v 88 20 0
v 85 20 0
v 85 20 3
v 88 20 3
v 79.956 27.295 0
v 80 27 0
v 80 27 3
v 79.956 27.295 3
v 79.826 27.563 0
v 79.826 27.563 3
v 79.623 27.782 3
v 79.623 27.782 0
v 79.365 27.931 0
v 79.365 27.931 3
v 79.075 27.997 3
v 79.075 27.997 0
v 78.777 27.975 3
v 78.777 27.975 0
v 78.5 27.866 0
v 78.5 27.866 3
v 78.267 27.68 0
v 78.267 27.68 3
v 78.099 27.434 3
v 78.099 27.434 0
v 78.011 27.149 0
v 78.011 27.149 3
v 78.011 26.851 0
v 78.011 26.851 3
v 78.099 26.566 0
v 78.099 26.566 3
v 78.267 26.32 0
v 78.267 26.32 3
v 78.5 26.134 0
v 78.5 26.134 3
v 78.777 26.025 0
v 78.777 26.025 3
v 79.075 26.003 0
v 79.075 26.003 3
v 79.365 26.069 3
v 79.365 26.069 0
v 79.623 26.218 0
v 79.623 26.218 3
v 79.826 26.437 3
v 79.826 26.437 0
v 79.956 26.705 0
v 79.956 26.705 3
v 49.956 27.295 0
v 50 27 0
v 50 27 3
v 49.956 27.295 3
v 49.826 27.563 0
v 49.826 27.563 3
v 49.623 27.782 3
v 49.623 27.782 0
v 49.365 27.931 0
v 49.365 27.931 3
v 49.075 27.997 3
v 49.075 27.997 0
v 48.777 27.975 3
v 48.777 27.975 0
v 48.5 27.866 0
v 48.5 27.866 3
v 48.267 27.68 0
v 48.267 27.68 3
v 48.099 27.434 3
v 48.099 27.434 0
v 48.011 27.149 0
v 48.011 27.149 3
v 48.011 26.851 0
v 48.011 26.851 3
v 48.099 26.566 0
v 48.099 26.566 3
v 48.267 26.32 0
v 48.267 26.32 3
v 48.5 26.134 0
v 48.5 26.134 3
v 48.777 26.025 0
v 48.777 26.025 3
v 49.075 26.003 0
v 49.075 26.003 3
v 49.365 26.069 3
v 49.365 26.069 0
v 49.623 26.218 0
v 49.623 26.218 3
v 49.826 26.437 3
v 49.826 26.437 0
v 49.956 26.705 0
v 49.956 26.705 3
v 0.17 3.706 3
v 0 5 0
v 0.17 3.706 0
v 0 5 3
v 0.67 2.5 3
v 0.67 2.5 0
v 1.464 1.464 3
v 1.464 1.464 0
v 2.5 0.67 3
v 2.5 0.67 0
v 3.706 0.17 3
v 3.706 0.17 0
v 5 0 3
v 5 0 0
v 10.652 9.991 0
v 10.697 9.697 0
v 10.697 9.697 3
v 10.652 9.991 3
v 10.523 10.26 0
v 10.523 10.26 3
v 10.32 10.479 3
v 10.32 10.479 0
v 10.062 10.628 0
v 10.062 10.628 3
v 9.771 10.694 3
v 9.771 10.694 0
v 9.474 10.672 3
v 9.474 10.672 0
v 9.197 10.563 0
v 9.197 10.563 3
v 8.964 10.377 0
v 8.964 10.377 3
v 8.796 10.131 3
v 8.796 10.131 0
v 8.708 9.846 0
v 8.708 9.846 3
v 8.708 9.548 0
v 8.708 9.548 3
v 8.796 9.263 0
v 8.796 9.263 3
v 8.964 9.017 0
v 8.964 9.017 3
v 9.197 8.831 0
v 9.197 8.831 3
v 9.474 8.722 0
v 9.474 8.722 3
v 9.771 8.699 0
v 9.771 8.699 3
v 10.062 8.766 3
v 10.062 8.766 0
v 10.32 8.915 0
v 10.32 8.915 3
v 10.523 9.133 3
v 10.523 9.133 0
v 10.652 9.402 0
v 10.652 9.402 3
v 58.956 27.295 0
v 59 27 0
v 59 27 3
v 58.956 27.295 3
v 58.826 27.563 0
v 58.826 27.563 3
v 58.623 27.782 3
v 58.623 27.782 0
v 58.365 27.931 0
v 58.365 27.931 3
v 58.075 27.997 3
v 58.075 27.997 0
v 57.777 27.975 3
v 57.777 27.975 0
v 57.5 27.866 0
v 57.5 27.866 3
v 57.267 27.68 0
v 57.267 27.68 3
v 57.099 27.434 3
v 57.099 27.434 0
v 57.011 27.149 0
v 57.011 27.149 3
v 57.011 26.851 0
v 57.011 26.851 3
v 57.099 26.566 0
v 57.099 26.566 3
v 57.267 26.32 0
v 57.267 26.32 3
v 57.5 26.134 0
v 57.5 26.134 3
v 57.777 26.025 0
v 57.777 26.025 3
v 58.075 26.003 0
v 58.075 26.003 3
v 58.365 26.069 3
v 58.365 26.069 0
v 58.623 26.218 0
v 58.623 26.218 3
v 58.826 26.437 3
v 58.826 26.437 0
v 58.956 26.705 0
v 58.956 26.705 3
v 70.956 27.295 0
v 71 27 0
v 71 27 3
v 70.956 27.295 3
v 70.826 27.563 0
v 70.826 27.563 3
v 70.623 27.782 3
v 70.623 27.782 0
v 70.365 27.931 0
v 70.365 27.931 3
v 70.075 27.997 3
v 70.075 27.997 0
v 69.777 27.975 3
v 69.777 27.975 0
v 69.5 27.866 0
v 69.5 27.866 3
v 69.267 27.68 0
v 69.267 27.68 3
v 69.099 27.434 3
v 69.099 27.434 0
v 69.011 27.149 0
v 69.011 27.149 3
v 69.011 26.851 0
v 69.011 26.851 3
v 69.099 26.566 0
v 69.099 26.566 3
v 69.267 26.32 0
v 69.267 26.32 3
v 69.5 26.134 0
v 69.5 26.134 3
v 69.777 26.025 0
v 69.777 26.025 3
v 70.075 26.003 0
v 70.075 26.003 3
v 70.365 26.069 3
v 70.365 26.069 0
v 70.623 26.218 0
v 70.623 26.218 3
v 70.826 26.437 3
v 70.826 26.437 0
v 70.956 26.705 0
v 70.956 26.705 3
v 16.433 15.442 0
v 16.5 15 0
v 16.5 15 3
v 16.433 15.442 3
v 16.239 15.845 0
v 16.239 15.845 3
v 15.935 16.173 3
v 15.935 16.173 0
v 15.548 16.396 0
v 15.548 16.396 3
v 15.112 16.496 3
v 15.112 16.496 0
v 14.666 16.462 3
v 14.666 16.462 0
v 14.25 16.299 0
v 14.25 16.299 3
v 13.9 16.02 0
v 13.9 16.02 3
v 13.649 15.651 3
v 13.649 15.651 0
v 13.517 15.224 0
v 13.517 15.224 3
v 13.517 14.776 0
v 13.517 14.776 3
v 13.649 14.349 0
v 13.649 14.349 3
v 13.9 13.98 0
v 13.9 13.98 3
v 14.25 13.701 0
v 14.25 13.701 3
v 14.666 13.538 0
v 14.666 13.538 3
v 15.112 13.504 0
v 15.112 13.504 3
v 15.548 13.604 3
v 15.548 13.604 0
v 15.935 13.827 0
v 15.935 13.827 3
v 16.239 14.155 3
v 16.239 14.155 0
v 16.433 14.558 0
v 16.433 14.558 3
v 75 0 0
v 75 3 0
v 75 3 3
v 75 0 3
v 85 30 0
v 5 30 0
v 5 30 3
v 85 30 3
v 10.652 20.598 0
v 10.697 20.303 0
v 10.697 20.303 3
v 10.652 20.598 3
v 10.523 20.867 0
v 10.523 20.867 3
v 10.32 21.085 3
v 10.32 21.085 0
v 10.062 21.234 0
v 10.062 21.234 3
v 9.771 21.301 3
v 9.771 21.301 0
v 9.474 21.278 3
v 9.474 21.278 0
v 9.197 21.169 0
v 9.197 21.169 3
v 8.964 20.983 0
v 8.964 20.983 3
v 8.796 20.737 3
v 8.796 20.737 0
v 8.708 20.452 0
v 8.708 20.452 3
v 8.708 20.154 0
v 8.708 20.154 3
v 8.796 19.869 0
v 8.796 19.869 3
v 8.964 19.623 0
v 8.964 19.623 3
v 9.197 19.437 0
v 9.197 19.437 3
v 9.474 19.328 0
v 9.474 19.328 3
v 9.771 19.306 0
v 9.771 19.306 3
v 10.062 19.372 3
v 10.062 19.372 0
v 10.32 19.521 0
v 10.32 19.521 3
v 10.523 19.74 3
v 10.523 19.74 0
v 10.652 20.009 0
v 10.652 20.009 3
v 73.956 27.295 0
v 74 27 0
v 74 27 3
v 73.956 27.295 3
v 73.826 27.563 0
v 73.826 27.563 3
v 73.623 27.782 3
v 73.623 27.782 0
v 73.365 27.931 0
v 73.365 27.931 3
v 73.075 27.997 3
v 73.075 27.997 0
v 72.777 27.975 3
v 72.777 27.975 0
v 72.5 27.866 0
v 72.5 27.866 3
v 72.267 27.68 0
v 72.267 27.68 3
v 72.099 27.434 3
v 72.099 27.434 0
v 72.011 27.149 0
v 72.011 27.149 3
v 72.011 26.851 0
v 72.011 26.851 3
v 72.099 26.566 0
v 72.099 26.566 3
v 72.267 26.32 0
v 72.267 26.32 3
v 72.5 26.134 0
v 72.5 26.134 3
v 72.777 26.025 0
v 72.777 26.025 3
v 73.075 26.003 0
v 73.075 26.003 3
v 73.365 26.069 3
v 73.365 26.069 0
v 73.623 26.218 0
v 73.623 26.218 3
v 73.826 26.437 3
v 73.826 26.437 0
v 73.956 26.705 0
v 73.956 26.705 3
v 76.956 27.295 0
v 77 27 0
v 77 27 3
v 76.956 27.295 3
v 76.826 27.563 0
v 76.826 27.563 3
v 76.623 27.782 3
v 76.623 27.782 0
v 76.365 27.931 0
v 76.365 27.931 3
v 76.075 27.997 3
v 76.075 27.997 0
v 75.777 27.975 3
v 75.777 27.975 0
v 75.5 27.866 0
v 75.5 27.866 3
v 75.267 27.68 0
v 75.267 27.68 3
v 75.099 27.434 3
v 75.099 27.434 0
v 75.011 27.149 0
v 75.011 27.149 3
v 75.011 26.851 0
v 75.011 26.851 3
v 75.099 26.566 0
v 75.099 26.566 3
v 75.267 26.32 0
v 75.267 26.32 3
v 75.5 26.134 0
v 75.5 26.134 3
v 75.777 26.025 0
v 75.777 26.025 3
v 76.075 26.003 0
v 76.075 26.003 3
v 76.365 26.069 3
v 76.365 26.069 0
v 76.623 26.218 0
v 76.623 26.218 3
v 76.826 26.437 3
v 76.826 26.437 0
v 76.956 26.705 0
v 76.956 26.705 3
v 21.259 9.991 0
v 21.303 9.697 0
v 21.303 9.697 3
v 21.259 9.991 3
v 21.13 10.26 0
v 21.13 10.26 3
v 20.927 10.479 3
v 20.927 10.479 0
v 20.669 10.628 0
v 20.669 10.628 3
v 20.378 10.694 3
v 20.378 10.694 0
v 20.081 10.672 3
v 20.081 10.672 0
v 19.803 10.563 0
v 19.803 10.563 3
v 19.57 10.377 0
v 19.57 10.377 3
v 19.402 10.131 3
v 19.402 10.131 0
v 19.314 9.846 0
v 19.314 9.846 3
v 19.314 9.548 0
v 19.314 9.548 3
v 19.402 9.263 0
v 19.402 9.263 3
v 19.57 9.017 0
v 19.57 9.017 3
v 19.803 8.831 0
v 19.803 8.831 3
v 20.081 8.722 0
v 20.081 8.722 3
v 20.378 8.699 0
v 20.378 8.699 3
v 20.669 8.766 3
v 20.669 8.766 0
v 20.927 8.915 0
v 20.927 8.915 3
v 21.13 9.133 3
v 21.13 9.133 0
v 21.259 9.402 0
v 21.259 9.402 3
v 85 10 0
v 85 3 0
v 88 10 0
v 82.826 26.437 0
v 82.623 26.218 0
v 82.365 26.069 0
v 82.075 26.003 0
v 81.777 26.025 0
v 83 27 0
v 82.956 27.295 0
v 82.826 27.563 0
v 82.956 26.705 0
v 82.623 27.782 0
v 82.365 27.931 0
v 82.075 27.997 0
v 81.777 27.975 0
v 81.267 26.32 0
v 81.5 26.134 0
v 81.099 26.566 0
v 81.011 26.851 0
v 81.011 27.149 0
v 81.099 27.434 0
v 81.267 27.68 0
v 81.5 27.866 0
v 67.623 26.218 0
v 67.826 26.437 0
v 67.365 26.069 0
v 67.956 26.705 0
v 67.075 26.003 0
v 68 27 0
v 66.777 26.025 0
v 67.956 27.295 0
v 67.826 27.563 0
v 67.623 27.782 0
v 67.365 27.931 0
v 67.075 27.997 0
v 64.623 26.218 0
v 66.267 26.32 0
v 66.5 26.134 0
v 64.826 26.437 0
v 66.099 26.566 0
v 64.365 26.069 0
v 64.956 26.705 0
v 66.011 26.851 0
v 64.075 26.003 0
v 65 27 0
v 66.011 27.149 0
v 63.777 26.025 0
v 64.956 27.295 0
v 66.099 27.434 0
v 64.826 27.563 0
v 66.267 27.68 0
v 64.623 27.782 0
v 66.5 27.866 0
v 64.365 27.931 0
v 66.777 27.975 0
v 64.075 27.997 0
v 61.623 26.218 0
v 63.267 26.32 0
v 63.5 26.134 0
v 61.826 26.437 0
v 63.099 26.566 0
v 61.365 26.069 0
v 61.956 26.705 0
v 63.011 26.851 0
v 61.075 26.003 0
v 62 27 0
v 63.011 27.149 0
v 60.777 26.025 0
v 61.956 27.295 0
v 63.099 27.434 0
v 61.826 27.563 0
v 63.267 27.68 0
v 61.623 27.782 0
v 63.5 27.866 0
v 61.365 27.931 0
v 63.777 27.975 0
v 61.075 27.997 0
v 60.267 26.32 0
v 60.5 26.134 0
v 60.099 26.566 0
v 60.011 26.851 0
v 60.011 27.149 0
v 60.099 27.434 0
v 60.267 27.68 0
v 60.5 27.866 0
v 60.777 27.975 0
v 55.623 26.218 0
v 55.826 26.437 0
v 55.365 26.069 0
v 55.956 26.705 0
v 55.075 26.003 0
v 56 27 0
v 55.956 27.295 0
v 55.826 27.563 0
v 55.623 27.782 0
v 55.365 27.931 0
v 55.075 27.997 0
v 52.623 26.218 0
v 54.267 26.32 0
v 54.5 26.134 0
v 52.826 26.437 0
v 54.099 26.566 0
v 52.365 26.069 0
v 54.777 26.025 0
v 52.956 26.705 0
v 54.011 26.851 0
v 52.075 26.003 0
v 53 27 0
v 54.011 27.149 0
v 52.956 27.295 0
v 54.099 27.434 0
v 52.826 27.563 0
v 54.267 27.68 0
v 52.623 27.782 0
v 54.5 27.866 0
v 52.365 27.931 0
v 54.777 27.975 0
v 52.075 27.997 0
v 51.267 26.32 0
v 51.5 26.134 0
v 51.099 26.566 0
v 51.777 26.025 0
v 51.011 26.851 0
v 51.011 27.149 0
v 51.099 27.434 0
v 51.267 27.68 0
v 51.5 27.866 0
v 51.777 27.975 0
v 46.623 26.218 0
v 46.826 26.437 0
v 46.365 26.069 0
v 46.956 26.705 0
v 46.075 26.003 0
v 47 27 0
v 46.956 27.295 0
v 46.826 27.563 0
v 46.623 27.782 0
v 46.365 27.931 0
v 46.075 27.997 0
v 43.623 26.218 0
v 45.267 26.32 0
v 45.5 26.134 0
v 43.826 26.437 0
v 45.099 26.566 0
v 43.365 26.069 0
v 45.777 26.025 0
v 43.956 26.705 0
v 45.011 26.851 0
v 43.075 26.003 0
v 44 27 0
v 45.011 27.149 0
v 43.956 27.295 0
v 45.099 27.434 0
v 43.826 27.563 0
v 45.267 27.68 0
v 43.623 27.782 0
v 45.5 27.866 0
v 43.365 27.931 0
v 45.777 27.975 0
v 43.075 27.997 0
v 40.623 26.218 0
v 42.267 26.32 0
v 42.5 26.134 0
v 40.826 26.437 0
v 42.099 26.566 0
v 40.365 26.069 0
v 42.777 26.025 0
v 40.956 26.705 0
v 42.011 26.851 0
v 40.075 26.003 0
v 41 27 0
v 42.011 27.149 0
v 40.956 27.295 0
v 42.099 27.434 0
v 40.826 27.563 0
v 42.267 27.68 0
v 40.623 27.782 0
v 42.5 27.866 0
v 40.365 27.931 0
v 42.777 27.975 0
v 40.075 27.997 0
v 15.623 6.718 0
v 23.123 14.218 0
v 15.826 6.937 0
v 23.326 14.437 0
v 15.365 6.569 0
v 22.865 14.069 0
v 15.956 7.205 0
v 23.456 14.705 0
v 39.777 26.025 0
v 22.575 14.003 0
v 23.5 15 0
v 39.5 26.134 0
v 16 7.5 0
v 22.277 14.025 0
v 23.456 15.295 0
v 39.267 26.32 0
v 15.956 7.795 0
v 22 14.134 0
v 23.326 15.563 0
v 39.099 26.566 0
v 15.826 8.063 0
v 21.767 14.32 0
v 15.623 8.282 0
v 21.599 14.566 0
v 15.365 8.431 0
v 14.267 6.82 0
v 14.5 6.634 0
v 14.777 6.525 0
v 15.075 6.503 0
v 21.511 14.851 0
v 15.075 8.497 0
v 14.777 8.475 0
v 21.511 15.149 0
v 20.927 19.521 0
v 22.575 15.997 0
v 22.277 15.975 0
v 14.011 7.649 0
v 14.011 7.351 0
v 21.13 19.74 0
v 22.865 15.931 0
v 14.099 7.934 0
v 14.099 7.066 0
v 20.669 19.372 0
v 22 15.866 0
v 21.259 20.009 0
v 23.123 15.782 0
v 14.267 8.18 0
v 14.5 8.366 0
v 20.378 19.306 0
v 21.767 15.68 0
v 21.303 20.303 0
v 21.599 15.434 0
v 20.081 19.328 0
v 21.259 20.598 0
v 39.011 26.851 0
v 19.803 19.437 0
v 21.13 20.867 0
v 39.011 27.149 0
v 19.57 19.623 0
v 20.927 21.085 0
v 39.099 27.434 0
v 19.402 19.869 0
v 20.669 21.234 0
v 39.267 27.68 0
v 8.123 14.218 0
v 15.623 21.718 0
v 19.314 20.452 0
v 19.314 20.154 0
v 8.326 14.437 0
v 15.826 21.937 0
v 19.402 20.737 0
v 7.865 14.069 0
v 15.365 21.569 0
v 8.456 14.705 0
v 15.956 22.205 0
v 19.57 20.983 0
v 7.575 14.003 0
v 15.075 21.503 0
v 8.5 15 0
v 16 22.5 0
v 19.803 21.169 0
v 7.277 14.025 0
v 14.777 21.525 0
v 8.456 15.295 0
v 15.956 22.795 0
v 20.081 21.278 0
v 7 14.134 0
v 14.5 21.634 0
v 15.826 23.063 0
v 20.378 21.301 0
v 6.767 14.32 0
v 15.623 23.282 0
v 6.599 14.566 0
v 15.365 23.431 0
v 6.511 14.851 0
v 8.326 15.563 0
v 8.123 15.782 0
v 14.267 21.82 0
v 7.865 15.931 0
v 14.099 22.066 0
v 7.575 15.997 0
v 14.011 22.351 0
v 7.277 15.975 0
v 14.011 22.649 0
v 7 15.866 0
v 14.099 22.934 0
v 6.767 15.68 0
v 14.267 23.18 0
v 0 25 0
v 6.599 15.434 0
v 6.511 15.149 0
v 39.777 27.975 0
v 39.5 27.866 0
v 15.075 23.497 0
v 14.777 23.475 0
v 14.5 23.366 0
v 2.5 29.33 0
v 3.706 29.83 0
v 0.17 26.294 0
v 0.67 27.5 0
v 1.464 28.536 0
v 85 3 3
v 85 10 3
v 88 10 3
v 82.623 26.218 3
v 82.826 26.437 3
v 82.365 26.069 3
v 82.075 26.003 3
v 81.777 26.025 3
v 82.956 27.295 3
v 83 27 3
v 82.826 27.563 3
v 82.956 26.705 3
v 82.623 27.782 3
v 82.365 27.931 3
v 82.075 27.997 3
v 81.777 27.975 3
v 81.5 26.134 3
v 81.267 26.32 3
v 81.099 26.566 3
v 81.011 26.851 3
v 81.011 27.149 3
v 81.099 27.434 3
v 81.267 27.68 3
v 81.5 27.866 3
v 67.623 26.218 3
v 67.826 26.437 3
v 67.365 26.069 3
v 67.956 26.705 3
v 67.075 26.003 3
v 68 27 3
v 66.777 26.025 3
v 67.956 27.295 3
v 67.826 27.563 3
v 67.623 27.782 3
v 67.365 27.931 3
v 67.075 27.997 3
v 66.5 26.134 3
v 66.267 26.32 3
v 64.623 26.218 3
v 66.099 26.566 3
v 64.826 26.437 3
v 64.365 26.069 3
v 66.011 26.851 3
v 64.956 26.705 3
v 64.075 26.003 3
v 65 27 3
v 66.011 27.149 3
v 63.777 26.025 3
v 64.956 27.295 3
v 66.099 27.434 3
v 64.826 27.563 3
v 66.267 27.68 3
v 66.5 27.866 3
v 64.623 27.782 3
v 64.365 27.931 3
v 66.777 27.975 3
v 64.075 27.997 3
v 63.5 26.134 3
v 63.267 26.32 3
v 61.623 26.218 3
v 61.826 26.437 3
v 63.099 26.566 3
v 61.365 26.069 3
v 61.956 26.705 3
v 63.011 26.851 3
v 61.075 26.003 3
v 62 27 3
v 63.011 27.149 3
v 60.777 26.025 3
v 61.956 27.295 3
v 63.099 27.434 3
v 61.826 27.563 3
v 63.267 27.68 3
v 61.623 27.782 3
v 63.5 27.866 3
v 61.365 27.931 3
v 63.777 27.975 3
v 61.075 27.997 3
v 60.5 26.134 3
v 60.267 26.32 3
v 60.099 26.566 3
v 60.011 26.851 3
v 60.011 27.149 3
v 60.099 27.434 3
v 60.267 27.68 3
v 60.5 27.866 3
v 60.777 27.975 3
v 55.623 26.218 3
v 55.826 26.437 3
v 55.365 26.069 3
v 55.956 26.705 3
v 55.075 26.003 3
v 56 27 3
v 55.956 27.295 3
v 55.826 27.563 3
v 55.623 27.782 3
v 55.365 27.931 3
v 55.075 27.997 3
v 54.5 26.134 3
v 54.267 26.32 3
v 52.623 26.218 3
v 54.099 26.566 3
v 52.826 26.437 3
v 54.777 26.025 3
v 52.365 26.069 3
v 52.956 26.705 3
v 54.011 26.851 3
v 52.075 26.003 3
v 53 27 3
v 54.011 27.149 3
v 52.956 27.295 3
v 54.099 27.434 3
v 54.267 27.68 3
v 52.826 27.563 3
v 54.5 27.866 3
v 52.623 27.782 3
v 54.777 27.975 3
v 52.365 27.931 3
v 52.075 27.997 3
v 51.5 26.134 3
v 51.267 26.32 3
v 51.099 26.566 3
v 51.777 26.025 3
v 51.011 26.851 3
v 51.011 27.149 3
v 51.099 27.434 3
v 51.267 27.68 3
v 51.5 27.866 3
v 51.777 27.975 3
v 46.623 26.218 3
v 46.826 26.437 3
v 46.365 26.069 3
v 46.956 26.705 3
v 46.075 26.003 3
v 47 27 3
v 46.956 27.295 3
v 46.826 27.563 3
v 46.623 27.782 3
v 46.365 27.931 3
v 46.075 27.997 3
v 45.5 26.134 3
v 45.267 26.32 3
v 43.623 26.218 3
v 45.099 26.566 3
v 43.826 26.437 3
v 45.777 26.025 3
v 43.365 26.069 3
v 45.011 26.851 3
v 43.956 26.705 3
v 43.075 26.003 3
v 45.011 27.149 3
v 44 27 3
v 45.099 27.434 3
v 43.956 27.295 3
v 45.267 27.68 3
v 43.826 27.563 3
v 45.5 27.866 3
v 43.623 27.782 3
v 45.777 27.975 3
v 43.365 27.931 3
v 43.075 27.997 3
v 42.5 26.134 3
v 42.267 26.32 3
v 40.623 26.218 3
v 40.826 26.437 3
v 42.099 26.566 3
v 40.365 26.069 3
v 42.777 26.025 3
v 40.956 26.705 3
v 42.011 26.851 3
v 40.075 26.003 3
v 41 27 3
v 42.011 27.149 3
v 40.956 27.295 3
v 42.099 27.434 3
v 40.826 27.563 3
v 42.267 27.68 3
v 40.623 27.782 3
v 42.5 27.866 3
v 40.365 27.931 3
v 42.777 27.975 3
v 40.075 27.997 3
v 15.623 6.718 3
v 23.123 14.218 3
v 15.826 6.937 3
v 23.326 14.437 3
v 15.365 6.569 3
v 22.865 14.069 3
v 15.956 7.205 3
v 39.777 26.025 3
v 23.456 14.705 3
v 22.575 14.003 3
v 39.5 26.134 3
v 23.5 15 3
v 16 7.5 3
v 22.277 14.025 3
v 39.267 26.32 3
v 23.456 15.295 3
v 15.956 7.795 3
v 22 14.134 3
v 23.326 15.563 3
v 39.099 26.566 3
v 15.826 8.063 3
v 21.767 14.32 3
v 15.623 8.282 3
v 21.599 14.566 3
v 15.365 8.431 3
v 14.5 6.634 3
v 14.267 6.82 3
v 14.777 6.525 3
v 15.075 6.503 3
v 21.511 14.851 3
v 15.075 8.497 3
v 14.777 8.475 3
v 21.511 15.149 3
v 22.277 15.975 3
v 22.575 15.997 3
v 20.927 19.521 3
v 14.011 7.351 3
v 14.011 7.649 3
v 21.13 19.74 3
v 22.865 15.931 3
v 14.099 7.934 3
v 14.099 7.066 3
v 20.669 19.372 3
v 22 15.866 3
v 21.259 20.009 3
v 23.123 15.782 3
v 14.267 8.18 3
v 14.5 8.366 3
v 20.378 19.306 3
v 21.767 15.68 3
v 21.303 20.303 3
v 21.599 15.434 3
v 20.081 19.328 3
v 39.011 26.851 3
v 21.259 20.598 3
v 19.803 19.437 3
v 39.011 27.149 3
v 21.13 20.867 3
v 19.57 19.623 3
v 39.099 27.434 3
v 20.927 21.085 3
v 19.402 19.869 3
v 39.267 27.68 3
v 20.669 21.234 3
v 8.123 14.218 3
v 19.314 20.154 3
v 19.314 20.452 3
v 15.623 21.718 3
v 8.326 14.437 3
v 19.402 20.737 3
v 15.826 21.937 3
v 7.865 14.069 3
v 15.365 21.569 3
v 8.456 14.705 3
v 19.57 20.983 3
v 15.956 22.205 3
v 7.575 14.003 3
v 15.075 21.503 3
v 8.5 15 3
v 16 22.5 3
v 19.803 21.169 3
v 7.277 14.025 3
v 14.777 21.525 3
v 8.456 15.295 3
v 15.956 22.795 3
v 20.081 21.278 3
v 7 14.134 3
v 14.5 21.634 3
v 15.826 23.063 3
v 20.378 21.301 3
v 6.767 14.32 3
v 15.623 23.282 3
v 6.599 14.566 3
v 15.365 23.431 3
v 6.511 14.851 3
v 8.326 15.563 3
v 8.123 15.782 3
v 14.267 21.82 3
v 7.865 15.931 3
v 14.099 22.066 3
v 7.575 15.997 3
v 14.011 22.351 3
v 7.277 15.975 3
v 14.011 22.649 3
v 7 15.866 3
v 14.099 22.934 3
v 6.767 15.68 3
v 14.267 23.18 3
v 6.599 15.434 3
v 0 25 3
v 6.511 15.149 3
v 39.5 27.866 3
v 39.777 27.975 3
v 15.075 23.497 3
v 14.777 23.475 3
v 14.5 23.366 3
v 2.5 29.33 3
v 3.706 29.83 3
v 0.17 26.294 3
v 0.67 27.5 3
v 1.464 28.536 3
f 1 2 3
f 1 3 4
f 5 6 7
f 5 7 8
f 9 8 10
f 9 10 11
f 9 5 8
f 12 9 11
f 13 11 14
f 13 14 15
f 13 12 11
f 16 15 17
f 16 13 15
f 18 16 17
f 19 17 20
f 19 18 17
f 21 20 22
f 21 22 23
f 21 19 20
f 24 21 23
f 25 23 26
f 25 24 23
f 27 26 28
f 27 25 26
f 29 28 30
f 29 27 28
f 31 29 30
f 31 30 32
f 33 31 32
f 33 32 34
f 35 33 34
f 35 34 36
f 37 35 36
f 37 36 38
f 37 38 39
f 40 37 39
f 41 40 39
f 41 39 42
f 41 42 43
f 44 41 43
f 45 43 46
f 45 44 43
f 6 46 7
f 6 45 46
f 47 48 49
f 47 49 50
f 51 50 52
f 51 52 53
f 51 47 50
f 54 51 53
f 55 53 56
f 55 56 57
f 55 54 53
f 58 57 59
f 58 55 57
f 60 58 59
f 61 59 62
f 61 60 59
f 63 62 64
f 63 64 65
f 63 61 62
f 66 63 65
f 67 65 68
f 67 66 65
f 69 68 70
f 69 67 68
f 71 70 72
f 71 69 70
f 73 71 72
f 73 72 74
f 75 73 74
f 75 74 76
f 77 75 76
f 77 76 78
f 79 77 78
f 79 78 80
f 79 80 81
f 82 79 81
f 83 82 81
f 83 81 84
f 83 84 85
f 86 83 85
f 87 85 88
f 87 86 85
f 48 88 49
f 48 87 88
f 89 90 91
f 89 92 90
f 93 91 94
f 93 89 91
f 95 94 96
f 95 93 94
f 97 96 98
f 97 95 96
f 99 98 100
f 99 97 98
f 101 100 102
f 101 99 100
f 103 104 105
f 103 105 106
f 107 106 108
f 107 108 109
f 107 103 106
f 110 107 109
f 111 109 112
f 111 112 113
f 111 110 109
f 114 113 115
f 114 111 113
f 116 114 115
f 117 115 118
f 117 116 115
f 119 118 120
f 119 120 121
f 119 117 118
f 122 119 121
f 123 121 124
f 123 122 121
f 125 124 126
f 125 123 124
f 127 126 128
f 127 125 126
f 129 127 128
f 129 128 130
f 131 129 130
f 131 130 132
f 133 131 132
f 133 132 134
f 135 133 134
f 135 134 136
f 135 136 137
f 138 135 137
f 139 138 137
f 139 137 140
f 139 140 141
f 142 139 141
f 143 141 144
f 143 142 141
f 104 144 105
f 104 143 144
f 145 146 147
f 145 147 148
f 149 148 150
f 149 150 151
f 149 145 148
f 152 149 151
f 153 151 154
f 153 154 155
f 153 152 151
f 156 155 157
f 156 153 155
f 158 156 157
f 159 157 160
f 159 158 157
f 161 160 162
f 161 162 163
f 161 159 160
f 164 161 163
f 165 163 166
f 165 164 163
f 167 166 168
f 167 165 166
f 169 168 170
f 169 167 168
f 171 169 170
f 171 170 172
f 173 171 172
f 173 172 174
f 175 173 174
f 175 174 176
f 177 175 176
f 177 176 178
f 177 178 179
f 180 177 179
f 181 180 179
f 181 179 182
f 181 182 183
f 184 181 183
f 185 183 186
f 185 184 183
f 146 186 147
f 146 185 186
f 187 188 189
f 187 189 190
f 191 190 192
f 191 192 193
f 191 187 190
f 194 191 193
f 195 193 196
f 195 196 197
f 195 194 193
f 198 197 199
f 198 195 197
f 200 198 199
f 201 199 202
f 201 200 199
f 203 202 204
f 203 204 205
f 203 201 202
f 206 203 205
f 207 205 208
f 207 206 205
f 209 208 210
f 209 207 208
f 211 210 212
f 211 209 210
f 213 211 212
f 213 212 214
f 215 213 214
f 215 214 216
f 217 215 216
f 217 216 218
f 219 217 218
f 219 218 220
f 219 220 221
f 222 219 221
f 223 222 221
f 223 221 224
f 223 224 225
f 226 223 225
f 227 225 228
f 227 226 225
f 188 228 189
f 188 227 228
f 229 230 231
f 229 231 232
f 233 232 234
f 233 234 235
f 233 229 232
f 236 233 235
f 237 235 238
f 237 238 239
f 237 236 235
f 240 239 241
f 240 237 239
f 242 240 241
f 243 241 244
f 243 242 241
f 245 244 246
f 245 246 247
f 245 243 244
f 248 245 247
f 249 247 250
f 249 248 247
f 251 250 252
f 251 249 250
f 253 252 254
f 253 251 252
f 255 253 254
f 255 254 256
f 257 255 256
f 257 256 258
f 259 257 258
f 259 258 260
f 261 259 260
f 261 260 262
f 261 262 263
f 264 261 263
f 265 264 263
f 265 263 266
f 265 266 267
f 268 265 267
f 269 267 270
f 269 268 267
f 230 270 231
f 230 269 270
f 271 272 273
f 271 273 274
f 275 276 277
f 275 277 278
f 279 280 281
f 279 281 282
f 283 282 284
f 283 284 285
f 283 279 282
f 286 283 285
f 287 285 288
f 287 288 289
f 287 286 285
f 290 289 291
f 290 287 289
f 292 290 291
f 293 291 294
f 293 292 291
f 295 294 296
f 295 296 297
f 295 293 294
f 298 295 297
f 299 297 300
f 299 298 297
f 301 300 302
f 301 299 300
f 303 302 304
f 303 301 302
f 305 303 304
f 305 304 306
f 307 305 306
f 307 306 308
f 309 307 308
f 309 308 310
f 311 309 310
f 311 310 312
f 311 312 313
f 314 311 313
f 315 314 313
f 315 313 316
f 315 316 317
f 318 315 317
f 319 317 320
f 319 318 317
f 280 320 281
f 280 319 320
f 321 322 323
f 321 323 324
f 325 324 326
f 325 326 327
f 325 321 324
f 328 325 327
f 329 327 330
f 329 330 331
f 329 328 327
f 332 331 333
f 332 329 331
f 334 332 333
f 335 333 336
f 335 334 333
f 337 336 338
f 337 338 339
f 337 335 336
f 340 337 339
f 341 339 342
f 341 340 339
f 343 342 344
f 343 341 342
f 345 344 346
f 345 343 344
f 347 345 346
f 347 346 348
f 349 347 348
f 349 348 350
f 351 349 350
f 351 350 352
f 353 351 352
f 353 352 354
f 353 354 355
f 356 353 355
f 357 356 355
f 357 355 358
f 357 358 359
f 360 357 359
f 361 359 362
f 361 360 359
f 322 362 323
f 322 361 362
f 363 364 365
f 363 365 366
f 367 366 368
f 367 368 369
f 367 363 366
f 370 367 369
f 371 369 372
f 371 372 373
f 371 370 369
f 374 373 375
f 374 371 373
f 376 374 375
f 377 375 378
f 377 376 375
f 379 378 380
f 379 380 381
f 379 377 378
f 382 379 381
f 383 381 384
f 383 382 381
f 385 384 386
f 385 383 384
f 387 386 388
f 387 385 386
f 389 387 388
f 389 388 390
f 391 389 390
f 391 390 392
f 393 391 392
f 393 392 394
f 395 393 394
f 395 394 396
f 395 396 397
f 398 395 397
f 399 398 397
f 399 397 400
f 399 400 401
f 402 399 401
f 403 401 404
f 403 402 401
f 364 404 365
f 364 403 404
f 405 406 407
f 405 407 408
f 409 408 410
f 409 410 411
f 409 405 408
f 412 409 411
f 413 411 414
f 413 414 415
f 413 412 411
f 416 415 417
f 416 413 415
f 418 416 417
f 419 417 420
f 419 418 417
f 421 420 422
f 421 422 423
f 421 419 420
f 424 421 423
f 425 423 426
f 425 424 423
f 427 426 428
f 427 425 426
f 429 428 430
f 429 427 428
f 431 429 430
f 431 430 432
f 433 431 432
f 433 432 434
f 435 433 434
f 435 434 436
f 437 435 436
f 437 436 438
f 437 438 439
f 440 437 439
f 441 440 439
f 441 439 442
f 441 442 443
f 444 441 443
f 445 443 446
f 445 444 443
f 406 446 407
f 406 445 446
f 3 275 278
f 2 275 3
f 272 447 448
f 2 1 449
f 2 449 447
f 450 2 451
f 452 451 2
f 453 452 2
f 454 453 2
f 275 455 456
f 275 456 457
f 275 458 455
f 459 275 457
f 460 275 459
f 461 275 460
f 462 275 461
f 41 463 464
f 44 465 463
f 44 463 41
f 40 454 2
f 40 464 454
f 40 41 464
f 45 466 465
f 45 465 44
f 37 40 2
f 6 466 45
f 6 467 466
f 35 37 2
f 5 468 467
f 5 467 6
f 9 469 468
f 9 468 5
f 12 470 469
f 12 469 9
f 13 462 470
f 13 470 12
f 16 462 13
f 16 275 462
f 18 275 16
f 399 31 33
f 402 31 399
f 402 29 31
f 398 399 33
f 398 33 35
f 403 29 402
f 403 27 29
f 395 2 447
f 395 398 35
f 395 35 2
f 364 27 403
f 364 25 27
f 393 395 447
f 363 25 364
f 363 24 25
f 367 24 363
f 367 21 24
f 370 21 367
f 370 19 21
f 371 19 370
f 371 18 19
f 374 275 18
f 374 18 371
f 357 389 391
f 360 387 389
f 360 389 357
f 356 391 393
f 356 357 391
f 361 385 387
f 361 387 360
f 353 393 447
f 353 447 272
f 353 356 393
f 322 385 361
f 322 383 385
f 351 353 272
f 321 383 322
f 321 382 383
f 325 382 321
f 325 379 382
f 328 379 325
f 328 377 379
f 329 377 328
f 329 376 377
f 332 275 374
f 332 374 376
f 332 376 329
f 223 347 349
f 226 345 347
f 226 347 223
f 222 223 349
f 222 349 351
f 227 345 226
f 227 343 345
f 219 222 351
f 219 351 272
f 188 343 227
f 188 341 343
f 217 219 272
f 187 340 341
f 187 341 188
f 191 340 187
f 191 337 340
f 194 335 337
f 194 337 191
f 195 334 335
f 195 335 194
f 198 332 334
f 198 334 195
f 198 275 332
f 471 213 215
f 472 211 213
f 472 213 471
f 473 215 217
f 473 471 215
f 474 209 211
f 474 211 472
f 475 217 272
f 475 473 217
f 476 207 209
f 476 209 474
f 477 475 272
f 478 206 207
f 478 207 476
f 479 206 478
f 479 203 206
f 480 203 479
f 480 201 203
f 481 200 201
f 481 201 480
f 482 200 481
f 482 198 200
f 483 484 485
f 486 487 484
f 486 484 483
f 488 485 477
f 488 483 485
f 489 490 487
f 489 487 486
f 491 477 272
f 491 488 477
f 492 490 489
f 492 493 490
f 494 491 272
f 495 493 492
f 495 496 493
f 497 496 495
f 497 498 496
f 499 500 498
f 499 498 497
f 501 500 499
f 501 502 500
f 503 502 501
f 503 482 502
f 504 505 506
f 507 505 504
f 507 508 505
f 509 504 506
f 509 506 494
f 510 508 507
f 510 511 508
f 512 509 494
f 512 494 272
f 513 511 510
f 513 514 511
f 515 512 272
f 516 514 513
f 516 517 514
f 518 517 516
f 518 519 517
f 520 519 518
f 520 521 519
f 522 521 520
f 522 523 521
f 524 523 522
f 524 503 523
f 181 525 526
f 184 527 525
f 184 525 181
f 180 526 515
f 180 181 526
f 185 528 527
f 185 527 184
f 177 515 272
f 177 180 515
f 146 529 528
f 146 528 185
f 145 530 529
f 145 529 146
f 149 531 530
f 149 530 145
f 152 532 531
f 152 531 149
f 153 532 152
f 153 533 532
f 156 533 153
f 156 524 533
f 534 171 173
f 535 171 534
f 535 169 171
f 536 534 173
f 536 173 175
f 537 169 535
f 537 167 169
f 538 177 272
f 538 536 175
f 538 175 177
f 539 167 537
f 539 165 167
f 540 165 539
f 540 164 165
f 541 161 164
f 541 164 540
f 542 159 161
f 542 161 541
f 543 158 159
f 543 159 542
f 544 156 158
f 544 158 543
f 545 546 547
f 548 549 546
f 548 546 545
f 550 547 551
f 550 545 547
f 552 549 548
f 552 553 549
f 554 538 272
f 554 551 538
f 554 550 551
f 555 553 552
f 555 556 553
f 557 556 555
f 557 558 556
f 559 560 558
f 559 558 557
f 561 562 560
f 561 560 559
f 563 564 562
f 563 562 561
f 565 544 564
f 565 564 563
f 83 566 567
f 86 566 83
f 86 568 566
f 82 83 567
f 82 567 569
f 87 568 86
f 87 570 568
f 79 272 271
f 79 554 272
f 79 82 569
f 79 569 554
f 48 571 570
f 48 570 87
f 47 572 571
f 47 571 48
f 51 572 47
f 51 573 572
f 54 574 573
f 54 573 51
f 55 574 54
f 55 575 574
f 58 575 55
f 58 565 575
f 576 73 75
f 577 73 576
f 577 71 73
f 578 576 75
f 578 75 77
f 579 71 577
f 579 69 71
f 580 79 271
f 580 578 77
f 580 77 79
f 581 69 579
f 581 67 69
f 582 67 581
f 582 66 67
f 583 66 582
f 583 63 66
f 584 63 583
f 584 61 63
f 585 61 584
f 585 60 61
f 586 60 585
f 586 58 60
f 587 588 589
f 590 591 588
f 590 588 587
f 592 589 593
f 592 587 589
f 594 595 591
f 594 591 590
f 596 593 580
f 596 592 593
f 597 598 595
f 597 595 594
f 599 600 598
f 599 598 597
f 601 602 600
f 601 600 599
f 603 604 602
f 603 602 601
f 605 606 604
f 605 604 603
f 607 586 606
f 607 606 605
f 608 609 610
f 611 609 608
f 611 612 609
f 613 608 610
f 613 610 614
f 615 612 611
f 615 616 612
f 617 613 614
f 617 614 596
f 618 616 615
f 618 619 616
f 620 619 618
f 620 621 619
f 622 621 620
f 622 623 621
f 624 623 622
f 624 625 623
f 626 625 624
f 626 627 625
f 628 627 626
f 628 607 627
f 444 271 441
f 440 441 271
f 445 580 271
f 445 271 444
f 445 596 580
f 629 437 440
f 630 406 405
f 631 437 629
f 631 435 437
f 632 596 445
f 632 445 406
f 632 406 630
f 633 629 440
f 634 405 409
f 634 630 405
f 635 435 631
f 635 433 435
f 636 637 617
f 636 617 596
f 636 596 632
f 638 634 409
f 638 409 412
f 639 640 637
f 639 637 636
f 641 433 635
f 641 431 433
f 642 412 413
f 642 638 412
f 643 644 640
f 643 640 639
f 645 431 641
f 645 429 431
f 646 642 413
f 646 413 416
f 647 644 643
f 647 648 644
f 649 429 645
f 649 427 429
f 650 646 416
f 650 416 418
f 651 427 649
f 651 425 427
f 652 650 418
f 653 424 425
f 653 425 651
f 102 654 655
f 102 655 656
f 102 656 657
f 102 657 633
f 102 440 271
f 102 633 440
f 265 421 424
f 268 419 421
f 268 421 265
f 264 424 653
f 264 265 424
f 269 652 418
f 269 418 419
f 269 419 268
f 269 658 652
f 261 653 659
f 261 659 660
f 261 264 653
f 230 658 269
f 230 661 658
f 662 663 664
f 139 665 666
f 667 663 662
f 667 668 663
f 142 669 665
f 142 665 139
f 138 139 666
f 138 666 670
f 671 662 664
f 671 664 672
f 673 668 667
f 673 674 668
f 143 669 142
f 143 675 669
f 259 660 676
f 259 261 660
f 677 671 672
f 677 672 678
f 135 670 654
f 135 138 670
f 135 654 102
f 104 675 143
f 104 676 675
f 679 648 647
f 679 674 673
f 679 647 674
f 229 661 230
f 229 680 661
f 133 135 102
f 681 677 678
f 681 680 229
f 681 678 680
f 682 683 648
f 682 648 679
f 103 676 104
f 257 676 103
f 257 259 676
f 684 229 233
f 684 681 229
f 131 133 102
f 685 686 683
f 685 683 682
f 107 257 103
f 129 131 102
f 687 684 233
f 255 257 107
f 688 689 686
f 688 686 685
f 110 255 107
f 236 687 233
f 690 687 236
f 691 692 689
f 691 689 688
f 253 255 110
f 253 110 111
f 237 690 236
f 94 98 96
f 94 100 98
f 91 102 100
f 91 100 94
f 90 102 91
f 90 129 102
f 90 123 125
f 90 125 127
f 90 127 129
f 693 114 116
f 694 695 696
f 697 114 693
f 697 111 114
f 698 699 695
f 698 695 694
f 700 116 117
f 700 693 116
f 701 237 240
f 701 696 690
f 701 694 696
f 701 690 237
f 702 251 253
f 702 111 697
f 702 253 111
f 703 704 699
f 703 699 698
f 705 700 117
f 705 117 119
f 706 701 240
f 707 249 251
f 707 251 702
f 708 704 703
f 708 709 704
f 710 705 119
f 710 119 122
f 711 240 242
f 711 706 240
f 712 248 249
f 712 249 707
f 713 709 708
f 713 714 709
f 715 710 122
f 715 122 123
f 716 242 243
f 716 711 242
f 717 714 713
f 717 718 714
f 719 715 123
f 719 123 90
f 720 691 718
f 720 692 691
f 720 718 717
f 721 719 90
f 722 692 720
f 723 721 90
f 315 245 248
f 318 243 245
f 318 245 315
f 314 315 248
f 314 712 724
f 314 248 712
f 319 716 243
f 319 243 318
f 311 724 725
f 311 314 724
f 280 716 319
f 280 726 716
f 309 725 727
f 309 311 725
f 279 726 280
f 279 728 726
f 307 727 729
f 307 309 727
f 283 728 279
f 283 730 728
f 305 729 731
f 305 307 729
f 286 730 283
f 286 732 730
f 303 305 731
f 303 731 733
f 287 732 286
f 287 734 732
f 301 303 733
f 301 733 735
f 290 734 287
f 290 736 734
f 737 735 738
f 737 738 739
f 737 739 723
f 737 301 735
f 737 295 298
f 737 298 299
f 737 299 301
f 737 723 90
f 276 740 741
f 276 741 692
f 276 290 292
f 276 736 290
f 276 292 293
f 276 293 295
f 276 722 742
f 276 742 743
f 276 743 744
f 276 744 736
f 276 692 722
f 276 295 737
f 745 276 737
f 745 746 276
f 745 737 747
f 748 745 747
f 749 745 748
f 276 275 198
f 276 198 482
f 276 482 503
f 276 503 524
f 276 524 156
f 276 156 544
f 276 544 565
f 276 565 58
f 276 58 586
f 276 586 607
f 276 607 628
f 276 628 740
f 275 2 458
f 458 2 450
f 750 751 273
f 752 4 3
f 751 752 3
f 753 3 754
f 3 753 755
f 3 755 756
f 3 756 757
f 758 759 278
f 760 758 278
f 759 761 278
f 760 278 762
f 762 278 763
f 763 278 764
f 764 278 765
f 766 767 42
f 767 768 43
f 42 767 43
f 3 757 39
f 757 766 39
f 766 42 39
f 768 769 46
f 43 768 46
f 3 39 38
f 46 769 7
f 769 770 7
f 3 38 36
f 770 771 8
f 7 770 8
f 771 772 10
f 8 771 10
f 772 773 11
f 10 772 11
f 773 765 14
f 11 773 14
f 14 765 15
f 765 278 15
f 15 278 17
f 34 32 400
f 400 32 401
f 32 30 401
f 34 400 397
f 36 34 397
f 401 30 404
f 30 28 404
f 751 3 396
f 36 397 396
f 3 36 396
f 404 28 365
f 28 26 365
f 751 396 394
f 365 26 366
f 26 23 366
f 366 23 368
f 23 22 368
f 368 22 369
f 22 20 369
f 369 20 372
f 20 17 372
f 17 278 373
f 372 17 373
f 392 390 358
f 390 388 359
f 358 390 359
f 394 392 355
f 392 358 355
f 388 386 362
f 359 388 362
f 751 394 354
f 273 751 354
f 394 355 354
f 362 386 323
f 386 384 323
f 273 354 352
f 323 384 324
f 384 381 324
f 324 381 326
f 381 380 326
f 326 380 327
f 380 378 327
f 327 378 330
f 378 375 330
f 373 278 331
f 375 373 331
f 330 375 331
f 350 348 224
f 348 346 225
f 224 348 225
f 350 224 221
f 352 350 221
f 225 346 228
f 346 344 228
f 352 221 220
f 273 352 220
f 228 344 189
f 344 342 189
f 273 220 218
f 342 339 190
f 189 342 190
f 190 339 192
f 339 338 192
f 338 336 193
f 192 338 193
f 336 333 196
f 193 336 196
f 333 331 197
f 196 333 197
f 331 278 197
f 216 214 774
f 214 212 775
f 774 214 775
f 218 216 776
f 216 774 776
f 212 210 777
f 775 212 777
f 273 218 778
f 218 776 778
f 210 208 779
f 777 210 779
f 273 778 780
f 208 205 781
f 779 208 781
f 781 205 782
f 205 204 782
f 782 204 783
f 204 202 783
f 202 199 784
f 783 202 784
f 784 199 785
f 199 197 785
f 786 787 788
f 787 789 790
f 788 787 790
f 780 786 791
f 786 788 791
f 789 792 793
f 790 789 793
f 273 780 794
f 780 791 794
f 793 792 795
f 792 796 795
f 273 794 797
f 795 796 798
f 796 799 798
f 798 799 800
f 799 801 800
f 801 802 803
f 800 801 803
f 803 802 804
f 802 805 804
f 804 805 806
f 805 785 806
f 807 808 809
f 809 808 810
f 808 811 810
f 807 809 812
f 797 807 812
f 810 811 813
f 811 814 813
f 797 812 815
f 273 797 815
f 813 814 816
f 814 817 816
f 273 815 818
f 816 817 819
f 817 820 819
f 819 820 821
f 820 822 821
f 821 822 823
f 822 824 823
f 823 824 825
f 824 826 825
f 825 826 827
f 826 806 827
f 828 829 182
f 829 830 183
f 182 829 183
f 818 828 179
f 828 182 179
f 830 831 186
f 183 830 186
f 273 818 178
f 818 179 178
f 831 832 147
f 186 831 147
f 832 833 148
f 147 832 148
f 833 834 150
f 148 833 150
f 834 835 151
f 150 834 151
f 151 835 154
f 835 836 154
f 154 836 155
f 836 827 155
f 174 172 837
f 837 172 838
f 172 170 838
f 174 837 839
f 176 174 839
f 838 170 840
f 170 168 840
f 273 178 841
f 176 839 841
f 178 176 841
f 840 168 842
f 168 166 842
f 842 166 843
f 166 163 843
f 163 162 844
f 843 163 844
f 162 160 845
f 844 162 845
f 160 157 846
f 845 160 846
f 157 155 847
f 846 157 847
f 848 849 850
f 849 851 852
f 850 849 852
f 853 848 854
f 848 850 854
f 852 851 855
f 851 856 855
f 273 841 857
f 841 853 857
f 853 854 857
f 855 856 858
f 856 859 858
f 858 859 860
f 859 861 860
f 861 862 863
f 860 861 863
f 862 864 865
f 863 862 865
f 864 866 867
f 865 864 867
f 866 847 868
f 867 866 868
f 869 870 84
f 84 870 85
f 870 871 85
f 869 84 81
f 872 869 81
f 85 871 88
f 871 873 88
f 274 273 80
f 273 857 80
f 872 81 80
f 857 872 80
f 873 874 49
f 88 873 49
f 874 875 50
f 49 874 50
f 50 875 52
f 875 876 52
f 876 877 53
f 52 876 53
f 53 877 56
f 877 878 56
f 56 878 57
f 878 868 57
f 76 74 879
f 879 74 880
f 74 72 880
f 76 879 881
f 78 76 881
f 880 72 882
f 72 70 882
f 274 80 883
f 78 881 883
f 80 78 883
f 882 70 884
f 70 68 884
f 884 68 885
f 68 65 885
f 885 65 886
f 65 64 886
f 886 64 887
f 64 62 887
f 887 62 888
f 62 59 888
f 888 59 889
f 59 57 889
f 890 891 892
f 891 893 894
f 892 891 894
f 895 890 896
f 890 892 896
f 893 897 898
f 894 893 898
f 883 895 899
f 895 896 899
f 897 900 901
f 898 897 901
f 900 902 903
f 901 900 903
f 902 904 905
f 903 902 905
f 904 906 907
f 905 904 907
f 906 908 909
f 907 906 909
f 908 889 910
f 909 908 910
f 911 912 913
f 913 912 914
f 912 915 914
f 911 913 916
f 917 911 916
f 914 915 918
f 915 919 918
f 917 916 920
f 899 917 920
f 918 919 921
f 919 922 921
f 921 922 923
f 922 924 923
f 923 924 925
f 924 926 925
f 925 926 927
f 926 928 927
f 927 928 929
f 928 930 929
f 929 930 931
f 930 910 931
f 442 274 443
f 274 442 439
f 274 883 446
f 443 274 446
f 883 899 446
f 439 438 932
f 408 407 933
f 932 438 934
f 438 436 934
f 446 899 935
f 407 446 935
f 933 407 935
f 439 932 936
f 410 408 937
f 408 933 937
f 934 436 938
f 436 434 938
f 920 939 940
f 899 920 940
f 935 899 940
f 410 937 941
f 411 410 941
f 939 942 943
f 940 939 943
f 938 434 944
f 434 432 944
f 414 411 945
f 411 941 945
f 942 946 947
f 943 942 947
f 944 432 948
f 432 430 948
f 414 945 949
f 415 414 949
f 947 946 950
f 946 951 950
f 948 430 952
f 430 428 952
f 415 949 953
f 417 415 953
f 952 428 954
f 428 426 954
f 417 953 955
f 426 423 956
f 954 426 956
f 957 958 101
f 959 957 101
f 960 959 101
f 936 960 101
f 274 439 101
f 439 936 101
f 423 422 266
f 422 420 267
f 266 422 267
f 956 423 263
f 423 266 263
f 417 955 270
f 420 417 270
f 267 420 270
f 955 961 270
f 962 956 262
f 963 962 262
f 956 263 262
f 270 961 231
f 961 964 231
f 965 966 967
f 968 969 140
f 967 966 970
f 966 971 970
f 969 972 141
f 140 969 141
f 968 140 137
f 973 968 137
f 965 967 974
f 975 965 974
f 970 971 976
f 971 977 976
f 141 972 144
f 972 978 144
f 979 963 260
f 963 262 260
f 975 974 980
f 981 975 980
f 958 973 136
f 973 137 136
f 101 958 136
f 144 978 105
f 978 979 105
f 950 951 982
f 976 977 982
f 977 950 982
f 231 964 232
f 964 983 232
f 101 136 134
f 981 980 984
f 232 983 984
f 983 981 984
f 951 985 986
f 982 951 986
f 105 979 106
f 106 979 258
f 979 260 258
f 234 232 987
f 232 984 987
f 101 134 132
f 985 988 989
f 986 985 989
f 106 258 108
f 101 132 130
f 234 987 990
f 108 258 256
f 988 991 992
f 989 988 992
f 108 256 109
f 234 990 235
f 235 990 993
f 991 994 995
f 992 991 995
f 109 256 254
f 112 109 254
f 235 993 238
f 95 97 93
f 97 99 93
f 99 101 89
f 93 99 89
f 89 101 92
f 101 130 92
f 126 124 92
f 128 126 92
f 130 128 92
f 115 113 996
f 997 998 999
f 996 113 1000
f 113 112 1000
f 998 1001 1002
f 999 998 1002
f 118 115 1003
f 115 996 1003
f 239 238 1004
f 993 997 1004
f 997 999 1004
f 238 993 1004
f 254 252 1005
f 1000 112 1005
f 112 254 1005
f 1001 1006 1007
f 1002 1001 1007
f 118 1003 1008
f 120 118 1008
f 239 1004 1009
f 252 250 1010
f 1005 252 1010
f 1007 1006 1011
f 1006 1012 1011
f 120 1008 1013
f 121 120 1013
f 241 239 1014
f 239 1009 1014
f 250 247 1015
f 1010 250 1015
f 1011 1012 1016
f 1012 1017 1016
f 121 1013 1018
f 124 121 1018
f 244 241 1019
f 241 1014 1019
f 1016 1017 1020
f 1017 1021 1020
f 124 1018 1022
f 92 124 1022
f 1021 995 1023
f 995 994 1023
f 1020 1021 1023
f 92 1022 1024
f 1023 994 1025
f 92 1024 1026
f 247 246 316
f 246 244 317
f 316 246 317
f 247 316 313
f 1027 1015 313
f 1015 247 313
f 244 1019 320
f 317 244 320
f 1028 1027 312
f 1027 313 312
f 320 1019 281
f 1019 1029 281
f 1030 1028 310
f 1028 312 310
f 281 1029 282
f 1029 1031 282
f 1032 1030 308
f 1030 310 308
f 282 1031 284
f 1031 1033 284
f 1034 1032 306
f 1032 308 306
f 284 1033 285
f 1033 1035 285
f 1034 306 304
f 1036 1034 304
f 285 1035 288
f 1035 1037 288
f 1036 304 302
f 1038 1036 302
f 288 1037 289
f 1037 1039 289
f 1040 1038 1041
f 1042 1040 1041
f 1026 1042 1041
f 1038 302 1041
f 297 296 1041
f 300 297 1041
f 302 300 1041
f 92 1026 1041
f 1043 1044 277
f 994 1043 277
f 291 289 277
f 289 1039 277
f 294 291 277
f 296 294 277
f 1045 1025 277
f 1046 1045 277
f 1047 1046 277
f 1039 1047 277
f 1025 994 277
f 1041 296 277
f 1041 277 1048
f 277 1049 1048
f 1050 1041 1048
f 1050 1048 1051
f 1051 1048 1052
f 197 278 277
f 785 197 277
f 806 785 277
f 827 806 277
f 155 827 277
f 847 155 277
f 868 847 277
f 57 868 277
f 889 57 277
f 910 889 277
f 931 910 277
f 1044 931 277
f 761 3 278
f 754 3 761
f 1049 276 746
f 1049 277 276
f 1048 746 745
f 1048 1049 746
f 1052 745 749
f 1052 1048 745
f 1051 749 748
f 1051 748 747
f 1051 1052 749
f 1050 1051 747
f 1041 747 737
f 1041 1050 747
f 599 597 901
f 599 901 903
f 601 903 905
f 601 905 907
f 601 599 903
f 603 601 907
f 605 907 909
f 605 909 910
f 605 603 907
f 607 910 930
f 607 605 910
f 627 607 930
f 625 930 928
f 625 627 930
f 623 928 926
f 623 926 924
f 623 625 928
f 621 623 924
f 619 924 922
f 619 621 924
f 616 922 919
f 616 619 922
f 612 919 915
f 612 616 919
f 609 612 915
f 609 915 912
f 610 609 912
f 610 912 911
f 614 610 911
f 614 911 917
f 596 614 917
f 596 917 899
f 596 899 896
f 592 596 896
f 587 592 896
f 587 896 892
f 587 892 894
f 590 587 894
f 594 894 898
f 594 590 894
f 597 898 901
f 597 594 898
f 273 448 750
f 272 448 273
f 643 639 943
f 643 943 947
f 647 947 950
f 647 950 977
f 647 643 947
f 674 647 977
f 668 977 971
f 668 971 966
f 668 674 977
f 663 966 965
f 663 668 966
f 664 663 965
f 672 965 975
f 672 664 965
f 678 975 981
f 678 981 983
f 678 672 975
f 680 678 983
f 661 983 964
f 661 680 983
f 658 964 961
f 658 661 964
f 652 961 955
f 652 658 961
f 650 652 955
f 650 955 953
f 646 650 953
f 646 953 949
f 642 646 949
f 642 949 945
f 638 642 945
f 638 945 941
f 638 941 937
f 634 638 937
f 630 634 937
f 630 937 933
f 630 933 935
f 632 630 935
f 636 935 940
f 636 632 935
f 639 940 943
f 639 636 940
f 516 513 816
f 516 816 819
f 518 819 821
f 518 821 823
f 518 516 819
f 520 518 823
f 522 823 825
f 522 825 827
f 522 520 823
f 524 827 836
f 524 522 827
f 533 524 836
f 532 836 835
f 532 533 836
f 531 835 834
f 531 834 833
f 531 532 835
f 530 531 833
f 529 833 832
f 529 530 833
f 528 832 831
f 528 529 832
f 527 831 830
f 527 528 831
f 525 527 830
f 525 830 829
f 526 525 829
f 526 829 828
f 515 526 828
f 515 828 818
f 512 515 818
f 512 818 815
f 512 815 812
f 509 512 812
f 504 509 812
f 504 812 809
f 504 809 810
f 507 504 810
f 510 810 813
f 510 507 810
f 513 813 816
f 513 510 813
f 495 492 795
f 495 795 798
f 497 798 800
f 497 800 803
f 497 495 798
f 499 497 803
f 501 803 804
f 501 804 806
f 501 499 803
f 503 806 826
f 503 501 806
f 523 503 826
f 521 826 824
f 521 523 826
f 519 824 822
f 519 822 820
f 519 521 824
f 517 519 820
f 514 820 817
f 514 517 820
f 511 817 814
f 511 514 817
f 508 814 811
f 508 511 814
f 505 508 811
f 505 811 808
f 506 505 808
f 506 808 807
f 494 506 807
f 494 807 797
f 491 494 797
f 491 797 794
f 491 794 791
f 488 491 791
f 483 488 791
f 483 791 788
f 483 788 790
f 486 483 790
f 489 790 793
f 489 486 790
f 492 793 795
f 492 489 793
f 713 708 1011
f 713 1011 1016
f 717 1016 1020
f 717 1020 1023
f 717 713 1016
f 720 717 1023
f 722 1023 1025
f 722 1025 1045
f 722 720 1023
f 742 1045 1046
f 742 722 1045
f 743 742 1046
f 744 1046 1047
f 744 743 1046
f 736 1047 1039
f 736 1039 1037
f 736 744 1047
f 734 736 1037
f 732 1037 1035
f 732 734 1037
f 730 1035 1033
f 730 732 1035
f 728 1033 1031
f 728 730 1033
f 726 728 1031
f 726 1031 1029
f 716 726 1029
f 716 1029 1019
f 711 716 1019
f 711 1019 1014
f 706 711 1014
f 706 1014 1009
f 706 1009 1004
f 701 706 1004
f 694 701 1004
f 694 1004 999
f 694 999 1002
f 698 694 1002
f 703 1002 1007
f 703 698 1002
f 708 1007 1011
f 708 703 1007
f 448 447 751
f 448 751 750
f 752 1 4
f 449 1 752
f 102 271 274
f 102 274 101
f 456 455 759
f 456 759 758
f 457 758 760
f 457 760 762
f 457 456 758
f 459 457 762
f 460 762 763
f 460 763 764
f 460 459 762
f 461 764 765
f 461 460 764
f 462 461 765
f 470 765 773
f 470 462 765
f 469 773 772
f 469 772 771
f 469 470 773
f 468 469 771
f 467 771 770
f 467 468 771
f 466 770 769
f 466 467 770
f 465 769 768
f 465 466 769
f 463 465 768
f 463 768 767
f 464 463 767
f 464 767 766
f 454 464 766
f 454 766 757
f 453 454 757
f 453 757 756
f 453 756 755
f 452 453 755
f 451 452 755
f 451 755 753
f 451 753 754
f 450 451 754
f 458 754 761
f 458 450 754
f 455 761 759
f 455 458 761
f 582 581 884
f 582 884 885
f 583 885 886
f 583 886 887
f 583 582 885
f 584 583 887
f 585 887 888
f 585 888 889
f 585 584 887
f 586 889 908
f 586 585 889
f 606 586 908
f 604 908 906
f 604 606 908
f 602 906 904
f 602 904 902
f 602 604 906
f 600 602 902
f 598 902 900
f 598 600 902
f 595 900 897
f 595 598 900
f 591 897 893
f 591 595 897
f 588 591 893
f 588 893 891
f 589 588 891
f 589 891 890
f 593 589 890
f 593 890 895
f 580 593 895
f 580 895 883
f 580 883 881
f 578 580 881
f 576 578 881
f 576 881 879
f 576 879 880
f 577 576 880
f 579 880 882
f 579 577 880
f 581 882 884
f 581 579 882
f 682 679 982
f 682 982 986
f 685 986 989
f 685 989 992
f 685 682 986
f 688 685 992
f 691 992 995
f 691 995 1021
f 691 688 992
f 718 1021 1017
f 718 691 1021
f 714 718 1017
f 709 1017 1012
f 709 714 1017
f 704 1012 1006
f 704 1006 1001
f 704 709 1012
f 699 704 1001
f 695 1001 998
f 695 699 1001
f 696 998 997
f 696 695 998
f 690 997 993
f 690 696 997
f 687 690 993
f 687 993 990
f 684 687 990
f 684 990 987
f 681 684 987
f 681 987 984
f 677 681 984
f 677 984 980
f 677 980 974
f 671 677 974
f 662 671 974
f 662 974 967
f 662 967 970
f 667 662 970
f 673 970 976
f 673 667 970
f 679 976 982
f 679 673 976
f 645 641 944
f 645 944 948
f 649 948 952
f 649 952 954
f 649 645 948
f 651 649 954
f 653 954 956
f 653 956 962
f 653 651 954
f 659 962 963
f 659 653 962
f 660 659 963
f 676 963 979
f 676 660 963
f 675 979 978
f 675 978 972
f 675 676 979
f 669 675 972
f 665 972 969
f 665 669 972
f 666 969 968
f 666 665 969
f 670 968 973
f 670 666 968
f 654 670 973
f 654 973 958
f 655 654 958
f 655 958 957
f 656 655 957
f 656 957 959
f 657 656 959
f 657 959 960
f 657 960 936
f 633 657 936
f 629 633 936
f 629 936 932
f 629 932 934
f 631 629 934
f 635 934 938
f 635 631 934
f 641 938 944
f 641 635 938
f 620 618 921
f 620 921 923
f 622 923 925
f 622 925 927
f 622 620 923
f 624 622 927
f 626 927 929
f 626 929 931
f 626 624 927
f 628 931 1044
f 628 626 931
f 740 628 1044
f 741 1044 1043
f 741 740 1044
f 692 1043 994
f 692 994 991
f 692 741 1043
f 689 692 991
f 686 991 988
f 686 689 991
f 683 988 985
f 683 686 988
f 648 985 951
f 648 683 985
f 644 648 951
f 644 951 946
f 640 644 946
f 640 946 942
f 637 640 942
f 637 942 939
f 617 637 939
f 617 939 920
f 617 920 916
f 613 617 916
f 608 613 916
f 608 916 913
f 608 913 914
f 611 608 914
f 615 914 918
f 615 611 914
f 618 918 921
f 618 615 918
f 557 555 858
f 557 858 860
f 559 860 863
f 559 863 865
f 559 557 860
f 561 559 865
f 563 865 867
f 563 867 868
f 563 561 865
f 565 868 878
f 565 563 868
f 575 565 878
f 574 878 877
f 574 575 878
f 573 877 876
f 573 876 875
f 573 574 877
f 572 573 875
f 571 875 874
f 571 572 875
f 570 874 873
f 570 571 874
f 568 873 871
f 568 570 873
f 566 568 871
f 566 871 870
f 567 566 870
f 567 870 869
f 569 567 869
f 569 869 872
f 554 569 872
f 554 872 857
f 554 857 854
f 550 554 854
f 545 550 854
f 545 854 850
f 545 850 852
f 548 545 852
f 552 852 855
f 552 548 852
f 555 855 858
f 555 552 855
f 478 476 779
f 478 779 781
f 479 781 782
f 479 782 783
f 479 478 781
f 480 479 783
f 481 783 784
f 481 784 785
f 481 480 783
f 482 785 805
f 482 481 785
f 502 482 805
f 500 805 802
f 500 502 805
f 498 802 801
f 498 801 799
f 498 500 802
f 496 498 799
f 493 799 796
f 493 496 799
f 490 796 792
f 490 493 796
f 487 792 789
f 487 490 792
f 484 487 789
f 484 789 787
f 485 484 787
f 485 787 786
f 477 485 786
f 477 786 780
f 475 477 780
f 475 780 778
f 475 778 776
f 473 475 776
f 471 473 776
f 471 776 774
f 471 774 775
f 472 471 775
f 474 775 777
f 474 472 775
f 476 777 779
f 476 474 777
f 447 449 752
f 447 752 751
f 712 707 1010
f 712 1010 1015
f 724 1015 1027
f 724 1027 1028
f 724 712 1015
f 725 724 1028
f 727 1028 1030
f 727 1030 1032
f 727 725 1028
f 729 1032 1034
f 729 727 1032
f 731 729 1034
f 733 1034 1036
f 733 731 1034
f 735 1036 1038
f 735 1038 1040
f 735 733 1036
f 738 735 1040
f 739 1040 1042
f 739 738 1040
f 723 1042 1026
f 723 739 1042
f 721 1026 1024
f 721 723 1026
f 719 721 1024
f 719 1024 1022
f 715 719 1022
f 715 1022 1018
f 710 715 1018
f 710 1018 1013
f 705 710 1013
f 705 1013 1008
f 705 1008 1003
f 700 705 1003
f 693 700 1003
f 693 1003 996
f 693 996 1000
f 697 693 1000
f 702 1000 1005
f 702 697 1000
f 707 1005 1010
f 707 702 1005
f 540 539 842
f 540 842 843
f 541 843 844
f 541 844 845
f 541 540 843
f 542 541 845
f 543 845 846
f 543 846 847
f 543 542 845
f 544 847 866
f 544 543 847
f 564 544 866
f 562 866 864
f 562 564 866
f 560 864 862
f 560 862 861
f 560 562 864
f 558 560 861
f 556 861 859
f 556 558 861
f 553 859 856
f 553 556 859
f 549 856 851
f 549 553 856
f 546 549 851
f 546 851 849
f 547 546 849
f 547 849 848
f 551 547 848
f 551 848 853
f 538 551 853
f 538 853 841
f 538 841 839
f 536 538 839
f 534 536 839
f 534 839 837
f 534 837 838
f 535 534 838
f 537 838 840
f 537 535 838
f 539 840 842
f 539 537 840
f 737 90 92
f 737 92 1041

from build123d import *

# Parameters (mm, degrees)
SKETCH1_R           = 1.5
SKETCH1_R_2         = 1
BOSS_EXTRUDE1_DEPTH = 3
FILLET1_R           = 5


with BuildPart() as part:
    # Sketch1 → Boss-Extrude1 (new body)
    with BuildSketch(Plane.XY):
        Polygon((85, 30), (85, 20), (88, 20), (88, 10), (85, 10), (85, 3), (75, 3), (75, 0), (0, 0), (0, 30), align=None)
        with Locations((15, 15)):
            Circle(SKETCH1_R, mode=Mode.SUBTRACT)
        with Locations((7.5, 15)):
            Circle(SKETCH1_R_2, mode=Mode.SUBTRACT)
        with Locations((9.696699141, 20.303300859)):
            Circle(SKETCH1_R_2, mode=Mode.SUBTRACT)
        with Locations((15, 22.5)):
            Circle(SKETCH1_R_2, mode=Mode.SUBTRACT)
        with Locations((20.303300859, 20.303300859)):
            Circle(SKETCH1_R_2, mode=Mode.SUBTRACT)
        with Locations((22.5, 15)):
            Circle(SKETCH1_R_2, mode=Mode.SUBTRACT)
        with Locations((20.303300859, 9.696699141)):
            Circle(SKETCH1_R_2, mode=Mode.SUBTRACT)
        with Locations((15, 7.5)):
            Circle(SKETCH1_R_2, mode=Mode.SUBTRACT)
        with Locations((9.696699141, 9.696699141)):
            Circle(SKETCH1_R_2, mode=Mode.SUBTRACT)
        with Locations((82, 27)):
            Circle(SKETCH1_R_2, mode=Mode.SUBTRACT)
        with Locations((79, 27)):
            Circle(SKETCH1_R_2, mode=Mode.SUBTRACT)
        with Locations((76, 27)):
            Circle(SKETCH1_R_2, mode=Mode.SUBTRACT)
        with Locations((73, 27)):
            Circle(SKETCH1_R_2, mode=Mode.SUBTRACT)
        with Locations((70, 27)):
            Circle(SKETCH1_R_2, mode=Mode.SUBTRACT)
        with Locations((67, 27)):
            Circle(SKETCH1_R_2, mode=Mode.SUBTRACT)
        with Locations((64, 27)):
            Circle(SKETCH1_R_2, mode=Mode.SUBTRACT)
        with Locations((61, 27)):
            Circle(SKETCH1_R_2, mode=Mode.SUBTRACT)
        with Locations((58, 27)):
            Circle(SKETCH1_R_2, mode=Mode.SUBTRACT)
        with Locations((55, 27)):
            Circle(SKETCH1_R_2, mode=Mode.SUBTRACT)
        with Locations((52, 27)):
            Circle(SKETCH1_R_2, mode=Mode.SUBTRACT)
        with Locations((49, 27)):
            Circle(SKETCH1_R_2, mode=Mode.SUBTRACT)
        with Locations((46, 27)):
            Circle(SKETCH1_R_2, mode=Mode.SUBTRACT)
        with Locations((43, 27)):
            Circle(SKETCH1_R_2, mode=Mode.SUBTRACT)
        with Locations((40, 27)):
            Circle(SKETCH1_R_2, mode=Mode.SUBTRACT)
    extrude(amount=BOSS_EXTRUDE1_DEPTH)

    # Fillet1
    fillet1_edges = [part.edges().sort_by_distance(p)[0] for p in [
        (0, 0, 1.5),
        (0, 30, 1.5),
    ]]
    fillet(fillet1_edges, radius=FILLET1_R)


solid = part.part
